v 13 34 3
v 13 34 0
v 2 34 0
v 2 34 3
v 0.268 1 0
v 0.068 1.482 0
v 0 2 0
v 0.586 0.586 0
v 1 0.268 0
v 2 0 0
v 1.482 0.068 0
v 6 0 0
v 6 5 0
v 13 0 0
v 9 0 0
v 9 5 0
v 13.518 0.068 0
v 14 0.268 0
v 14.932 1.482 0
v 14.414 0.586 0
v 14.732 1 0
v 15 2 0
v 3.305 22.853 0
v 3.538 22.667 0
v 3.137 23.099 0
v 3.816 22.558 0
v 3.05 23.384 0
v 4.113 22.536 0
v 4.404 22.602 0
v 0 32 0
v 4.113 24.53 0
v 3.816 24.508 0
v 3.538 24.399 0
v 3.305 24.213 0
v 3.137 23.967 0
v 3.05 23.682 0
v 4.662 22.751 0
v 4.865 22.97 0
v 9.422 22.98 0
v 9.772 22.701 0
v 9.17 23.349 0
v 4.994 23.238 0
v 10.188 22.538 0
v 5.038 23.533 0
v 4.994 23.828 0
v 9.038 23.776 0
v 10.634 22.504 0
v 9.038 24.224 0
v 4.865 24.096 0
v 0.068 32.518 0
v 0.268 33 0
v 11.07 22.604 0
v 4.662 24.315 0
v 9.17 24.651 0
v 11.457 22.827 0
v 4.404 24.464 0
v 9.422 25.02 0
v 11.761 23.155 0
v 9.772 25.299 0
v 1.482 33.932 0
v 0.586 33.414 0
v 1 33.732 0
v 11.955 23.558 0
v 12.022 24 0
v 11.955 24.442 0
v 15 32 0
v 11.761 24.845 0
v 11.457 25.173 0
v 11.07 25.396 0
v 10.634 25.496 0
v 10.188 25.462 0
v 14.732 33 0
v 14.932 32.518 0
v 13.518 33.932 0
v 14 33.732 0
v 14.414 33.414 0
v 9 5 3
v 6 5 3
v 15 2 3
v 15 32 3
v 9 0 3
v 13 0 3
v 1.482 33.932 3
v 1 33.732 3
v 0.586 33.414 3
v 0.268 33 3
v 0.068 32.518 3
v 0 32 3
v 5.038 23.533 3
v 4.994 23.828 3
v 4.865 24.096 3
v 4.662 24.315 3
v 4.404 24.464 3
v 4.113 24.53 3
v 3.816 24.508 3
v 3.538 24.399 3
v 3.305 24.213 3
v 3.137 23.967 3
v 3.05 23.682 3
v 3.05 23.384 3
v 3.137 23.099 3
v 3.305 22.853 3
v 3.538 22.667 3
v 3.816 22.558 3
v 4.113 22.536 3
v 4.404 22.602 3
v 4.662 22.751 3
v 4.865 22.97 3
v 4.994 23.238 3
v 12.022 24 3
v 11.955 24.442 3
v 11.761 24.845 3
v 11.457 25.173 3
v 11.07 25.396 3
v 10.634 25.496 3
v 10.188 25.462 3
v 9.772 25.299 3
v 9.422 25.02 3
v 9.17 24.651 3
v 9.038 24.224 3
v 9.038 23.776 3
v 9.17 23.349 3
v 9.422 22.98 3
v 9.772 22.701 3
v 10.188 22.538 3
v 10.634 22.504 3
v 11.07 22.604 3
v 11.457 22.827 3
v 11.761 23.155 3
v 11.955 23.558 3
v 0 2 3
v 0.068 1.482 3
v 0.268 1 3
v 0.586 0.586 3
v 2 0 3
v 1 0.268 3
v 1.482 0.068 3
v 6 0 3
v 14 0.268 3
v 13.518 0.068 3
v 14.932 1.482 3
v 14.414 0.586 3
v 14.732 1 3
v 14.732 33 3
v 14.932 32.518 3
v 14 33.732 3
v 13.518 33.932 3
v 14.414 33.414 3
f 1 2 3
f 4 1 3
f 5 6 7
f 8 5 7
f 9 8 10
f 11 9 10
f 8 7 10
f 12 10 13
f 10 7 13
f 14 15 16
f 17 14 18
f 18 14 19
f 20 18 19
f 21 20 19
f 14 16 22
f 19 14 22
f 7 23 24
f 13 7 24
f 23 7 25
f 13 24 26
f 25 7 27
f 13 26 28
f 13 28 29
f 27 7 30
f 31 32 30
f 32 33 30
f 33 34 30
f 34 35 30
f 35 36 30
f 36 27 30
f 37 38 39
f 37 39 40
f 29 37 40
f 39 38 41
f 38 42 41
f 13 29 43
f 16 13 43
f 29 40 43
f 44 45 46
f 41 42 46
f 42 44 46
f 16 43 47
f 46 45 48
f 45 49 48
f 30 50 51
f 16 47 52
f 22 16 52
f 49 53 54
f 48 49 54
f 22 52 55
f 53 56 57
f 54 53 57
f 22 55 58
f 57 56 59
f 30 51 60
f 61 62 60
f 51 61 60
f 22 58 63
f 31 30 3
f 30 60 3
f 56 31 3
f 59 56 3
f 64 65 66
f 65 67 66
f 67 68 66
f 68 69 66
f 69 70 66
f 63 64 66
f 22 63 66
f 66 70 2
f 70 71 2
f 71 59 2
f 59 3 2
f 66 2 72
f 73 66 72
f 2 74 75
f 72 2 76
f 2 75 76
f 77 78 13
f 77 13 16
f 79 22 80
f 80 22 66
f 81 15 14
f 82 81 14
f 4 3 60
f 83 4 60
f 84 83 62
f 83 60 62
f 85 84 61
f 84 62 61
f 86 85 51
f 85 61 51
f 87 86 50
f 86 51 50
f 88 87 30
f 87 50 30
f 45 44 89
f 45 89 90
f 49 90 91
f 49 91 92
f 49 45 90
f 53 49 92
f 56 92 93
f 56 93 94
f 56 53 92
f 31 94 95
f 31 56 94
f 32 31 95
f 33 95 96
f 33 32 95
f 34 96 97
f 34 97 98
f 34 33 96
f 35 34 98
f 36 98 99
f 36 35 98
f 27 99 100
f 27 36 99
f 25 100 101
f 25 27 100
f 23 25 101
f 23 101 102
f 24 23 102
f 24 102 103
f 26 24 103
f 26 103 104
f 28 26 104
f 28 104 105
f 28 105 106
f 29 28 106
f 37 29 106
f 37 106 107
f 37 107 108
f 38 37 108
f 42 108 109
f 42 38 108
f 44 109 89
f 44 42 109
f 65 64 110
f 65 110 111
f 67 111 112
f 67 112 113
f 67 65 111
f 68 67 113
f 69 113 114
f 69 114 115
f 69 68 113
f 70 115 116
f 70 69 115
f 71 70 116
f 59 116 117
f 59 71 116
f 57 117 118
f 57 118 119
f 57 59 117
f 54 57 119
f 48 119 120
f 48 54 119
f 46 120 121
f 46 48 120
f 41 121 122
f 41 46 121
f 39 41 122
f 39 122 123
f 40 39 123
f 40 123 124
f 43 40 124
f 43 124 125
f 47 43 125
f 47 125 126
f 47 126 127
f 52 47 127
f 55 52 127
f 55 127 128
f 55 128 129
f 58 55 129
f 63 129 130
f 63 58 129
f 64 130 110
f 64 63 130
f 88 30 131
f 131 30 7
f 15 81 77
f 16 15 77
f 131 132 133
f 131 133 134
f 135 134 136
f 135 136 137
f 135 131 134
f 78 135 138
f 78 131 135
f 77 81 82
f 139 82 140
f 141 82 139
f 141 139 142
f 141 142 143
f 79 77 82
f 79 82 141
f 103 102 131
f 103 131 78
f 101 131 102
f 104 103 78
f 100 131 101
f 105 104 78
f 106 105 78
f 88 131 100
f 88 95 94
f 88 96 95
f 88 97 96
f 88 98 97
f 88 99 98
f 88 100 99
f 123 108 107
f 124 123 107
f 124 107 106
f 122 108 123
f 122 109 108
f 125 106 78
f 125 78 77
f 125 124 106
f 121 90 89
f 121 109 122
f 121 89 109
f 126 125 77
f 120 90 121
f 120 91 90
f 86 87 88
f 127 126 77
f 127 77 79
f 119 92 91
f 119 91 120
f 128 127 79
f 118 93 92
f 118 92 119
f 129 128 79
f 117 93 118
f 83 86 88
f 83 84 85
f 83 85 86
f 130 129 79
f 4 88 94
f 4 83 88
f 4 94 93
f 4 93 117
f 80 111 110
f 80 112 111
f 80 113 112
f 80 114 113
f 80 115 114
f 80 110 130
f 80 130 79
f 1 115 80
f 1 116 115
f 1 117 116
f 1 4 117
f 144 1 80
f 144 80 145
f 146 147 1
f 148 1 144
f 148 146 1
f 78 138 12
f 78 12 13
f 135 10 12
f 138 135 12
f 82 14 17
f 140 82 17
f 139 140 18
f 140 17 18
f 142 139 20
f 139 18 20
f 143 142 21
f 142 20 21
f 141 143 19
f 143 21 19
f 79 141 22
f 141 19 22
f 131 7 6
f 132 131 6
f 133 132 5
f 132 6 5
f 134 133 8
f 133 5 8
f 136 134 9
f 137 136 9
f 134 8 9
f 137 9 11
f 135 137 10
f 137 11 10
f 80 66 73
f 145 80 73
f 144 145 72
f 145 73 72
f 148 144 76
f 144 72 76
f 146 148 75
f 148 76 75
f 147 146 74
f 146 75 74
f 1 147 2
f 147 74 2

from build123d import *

# Parameters (mm, degrees)
SKETCH1_R           = 1.5
SKETCH1_R_2         = 1
BOSS_EXTRUDE1_DEPTH = 3
SKETCH4_W           = 3
SKETCH4_H           = 5
CUT_EXTRUDE1_DEPTH  = 4


with BuildPart() as part:
    # Sketch1 → Boss-Extrude1 (new body)
    with BuildSketch(Plane.XY):
        with BuildLine():
            Line((2, 0), (13, 0))
            ThreePointArc((13, 0), (14.414213562, 0.585786438), (15, 2))
            Line((15, 2), (15, 32))
            ThreePointArc((15, 32), (14.414213562, 33.414213562), (13, 34))
            Line((13, 34), (2, 34))
            ThreePointArc((2, 34), (0.585786438, 33.414213562), (0, 32))
            Line((0, 32), (0, 2))
            ThreePointArc((0, 2), (0.585786438, 0.585786438), (2, 0))
        make_face()
        with Locations((10.521654895, 24)):
            Circle(SKETCH1_R, mode=Mode.SUBTRACT)
        with Locations((4.038452424, 23.533003519)):
            Circle(SKETCH1_R_2, mode=Mode.SUBTRACT)
    extrude(amount=BOSS_EXTRUDE1_DEPTH)

    # Sketch4 → Cut-Extrude1 (cut, through all)
    with BuildSketch(Plane.XY.offset(3)):
        with Locations((7.5, 2.5)):
            Rectangle(SKETCH4_W, SKETCH4_H)
    extrude(amount=-CUT_EXTRUDE1_DEPTH, mode=Mode.SUBTRACT)


solid = part.part
